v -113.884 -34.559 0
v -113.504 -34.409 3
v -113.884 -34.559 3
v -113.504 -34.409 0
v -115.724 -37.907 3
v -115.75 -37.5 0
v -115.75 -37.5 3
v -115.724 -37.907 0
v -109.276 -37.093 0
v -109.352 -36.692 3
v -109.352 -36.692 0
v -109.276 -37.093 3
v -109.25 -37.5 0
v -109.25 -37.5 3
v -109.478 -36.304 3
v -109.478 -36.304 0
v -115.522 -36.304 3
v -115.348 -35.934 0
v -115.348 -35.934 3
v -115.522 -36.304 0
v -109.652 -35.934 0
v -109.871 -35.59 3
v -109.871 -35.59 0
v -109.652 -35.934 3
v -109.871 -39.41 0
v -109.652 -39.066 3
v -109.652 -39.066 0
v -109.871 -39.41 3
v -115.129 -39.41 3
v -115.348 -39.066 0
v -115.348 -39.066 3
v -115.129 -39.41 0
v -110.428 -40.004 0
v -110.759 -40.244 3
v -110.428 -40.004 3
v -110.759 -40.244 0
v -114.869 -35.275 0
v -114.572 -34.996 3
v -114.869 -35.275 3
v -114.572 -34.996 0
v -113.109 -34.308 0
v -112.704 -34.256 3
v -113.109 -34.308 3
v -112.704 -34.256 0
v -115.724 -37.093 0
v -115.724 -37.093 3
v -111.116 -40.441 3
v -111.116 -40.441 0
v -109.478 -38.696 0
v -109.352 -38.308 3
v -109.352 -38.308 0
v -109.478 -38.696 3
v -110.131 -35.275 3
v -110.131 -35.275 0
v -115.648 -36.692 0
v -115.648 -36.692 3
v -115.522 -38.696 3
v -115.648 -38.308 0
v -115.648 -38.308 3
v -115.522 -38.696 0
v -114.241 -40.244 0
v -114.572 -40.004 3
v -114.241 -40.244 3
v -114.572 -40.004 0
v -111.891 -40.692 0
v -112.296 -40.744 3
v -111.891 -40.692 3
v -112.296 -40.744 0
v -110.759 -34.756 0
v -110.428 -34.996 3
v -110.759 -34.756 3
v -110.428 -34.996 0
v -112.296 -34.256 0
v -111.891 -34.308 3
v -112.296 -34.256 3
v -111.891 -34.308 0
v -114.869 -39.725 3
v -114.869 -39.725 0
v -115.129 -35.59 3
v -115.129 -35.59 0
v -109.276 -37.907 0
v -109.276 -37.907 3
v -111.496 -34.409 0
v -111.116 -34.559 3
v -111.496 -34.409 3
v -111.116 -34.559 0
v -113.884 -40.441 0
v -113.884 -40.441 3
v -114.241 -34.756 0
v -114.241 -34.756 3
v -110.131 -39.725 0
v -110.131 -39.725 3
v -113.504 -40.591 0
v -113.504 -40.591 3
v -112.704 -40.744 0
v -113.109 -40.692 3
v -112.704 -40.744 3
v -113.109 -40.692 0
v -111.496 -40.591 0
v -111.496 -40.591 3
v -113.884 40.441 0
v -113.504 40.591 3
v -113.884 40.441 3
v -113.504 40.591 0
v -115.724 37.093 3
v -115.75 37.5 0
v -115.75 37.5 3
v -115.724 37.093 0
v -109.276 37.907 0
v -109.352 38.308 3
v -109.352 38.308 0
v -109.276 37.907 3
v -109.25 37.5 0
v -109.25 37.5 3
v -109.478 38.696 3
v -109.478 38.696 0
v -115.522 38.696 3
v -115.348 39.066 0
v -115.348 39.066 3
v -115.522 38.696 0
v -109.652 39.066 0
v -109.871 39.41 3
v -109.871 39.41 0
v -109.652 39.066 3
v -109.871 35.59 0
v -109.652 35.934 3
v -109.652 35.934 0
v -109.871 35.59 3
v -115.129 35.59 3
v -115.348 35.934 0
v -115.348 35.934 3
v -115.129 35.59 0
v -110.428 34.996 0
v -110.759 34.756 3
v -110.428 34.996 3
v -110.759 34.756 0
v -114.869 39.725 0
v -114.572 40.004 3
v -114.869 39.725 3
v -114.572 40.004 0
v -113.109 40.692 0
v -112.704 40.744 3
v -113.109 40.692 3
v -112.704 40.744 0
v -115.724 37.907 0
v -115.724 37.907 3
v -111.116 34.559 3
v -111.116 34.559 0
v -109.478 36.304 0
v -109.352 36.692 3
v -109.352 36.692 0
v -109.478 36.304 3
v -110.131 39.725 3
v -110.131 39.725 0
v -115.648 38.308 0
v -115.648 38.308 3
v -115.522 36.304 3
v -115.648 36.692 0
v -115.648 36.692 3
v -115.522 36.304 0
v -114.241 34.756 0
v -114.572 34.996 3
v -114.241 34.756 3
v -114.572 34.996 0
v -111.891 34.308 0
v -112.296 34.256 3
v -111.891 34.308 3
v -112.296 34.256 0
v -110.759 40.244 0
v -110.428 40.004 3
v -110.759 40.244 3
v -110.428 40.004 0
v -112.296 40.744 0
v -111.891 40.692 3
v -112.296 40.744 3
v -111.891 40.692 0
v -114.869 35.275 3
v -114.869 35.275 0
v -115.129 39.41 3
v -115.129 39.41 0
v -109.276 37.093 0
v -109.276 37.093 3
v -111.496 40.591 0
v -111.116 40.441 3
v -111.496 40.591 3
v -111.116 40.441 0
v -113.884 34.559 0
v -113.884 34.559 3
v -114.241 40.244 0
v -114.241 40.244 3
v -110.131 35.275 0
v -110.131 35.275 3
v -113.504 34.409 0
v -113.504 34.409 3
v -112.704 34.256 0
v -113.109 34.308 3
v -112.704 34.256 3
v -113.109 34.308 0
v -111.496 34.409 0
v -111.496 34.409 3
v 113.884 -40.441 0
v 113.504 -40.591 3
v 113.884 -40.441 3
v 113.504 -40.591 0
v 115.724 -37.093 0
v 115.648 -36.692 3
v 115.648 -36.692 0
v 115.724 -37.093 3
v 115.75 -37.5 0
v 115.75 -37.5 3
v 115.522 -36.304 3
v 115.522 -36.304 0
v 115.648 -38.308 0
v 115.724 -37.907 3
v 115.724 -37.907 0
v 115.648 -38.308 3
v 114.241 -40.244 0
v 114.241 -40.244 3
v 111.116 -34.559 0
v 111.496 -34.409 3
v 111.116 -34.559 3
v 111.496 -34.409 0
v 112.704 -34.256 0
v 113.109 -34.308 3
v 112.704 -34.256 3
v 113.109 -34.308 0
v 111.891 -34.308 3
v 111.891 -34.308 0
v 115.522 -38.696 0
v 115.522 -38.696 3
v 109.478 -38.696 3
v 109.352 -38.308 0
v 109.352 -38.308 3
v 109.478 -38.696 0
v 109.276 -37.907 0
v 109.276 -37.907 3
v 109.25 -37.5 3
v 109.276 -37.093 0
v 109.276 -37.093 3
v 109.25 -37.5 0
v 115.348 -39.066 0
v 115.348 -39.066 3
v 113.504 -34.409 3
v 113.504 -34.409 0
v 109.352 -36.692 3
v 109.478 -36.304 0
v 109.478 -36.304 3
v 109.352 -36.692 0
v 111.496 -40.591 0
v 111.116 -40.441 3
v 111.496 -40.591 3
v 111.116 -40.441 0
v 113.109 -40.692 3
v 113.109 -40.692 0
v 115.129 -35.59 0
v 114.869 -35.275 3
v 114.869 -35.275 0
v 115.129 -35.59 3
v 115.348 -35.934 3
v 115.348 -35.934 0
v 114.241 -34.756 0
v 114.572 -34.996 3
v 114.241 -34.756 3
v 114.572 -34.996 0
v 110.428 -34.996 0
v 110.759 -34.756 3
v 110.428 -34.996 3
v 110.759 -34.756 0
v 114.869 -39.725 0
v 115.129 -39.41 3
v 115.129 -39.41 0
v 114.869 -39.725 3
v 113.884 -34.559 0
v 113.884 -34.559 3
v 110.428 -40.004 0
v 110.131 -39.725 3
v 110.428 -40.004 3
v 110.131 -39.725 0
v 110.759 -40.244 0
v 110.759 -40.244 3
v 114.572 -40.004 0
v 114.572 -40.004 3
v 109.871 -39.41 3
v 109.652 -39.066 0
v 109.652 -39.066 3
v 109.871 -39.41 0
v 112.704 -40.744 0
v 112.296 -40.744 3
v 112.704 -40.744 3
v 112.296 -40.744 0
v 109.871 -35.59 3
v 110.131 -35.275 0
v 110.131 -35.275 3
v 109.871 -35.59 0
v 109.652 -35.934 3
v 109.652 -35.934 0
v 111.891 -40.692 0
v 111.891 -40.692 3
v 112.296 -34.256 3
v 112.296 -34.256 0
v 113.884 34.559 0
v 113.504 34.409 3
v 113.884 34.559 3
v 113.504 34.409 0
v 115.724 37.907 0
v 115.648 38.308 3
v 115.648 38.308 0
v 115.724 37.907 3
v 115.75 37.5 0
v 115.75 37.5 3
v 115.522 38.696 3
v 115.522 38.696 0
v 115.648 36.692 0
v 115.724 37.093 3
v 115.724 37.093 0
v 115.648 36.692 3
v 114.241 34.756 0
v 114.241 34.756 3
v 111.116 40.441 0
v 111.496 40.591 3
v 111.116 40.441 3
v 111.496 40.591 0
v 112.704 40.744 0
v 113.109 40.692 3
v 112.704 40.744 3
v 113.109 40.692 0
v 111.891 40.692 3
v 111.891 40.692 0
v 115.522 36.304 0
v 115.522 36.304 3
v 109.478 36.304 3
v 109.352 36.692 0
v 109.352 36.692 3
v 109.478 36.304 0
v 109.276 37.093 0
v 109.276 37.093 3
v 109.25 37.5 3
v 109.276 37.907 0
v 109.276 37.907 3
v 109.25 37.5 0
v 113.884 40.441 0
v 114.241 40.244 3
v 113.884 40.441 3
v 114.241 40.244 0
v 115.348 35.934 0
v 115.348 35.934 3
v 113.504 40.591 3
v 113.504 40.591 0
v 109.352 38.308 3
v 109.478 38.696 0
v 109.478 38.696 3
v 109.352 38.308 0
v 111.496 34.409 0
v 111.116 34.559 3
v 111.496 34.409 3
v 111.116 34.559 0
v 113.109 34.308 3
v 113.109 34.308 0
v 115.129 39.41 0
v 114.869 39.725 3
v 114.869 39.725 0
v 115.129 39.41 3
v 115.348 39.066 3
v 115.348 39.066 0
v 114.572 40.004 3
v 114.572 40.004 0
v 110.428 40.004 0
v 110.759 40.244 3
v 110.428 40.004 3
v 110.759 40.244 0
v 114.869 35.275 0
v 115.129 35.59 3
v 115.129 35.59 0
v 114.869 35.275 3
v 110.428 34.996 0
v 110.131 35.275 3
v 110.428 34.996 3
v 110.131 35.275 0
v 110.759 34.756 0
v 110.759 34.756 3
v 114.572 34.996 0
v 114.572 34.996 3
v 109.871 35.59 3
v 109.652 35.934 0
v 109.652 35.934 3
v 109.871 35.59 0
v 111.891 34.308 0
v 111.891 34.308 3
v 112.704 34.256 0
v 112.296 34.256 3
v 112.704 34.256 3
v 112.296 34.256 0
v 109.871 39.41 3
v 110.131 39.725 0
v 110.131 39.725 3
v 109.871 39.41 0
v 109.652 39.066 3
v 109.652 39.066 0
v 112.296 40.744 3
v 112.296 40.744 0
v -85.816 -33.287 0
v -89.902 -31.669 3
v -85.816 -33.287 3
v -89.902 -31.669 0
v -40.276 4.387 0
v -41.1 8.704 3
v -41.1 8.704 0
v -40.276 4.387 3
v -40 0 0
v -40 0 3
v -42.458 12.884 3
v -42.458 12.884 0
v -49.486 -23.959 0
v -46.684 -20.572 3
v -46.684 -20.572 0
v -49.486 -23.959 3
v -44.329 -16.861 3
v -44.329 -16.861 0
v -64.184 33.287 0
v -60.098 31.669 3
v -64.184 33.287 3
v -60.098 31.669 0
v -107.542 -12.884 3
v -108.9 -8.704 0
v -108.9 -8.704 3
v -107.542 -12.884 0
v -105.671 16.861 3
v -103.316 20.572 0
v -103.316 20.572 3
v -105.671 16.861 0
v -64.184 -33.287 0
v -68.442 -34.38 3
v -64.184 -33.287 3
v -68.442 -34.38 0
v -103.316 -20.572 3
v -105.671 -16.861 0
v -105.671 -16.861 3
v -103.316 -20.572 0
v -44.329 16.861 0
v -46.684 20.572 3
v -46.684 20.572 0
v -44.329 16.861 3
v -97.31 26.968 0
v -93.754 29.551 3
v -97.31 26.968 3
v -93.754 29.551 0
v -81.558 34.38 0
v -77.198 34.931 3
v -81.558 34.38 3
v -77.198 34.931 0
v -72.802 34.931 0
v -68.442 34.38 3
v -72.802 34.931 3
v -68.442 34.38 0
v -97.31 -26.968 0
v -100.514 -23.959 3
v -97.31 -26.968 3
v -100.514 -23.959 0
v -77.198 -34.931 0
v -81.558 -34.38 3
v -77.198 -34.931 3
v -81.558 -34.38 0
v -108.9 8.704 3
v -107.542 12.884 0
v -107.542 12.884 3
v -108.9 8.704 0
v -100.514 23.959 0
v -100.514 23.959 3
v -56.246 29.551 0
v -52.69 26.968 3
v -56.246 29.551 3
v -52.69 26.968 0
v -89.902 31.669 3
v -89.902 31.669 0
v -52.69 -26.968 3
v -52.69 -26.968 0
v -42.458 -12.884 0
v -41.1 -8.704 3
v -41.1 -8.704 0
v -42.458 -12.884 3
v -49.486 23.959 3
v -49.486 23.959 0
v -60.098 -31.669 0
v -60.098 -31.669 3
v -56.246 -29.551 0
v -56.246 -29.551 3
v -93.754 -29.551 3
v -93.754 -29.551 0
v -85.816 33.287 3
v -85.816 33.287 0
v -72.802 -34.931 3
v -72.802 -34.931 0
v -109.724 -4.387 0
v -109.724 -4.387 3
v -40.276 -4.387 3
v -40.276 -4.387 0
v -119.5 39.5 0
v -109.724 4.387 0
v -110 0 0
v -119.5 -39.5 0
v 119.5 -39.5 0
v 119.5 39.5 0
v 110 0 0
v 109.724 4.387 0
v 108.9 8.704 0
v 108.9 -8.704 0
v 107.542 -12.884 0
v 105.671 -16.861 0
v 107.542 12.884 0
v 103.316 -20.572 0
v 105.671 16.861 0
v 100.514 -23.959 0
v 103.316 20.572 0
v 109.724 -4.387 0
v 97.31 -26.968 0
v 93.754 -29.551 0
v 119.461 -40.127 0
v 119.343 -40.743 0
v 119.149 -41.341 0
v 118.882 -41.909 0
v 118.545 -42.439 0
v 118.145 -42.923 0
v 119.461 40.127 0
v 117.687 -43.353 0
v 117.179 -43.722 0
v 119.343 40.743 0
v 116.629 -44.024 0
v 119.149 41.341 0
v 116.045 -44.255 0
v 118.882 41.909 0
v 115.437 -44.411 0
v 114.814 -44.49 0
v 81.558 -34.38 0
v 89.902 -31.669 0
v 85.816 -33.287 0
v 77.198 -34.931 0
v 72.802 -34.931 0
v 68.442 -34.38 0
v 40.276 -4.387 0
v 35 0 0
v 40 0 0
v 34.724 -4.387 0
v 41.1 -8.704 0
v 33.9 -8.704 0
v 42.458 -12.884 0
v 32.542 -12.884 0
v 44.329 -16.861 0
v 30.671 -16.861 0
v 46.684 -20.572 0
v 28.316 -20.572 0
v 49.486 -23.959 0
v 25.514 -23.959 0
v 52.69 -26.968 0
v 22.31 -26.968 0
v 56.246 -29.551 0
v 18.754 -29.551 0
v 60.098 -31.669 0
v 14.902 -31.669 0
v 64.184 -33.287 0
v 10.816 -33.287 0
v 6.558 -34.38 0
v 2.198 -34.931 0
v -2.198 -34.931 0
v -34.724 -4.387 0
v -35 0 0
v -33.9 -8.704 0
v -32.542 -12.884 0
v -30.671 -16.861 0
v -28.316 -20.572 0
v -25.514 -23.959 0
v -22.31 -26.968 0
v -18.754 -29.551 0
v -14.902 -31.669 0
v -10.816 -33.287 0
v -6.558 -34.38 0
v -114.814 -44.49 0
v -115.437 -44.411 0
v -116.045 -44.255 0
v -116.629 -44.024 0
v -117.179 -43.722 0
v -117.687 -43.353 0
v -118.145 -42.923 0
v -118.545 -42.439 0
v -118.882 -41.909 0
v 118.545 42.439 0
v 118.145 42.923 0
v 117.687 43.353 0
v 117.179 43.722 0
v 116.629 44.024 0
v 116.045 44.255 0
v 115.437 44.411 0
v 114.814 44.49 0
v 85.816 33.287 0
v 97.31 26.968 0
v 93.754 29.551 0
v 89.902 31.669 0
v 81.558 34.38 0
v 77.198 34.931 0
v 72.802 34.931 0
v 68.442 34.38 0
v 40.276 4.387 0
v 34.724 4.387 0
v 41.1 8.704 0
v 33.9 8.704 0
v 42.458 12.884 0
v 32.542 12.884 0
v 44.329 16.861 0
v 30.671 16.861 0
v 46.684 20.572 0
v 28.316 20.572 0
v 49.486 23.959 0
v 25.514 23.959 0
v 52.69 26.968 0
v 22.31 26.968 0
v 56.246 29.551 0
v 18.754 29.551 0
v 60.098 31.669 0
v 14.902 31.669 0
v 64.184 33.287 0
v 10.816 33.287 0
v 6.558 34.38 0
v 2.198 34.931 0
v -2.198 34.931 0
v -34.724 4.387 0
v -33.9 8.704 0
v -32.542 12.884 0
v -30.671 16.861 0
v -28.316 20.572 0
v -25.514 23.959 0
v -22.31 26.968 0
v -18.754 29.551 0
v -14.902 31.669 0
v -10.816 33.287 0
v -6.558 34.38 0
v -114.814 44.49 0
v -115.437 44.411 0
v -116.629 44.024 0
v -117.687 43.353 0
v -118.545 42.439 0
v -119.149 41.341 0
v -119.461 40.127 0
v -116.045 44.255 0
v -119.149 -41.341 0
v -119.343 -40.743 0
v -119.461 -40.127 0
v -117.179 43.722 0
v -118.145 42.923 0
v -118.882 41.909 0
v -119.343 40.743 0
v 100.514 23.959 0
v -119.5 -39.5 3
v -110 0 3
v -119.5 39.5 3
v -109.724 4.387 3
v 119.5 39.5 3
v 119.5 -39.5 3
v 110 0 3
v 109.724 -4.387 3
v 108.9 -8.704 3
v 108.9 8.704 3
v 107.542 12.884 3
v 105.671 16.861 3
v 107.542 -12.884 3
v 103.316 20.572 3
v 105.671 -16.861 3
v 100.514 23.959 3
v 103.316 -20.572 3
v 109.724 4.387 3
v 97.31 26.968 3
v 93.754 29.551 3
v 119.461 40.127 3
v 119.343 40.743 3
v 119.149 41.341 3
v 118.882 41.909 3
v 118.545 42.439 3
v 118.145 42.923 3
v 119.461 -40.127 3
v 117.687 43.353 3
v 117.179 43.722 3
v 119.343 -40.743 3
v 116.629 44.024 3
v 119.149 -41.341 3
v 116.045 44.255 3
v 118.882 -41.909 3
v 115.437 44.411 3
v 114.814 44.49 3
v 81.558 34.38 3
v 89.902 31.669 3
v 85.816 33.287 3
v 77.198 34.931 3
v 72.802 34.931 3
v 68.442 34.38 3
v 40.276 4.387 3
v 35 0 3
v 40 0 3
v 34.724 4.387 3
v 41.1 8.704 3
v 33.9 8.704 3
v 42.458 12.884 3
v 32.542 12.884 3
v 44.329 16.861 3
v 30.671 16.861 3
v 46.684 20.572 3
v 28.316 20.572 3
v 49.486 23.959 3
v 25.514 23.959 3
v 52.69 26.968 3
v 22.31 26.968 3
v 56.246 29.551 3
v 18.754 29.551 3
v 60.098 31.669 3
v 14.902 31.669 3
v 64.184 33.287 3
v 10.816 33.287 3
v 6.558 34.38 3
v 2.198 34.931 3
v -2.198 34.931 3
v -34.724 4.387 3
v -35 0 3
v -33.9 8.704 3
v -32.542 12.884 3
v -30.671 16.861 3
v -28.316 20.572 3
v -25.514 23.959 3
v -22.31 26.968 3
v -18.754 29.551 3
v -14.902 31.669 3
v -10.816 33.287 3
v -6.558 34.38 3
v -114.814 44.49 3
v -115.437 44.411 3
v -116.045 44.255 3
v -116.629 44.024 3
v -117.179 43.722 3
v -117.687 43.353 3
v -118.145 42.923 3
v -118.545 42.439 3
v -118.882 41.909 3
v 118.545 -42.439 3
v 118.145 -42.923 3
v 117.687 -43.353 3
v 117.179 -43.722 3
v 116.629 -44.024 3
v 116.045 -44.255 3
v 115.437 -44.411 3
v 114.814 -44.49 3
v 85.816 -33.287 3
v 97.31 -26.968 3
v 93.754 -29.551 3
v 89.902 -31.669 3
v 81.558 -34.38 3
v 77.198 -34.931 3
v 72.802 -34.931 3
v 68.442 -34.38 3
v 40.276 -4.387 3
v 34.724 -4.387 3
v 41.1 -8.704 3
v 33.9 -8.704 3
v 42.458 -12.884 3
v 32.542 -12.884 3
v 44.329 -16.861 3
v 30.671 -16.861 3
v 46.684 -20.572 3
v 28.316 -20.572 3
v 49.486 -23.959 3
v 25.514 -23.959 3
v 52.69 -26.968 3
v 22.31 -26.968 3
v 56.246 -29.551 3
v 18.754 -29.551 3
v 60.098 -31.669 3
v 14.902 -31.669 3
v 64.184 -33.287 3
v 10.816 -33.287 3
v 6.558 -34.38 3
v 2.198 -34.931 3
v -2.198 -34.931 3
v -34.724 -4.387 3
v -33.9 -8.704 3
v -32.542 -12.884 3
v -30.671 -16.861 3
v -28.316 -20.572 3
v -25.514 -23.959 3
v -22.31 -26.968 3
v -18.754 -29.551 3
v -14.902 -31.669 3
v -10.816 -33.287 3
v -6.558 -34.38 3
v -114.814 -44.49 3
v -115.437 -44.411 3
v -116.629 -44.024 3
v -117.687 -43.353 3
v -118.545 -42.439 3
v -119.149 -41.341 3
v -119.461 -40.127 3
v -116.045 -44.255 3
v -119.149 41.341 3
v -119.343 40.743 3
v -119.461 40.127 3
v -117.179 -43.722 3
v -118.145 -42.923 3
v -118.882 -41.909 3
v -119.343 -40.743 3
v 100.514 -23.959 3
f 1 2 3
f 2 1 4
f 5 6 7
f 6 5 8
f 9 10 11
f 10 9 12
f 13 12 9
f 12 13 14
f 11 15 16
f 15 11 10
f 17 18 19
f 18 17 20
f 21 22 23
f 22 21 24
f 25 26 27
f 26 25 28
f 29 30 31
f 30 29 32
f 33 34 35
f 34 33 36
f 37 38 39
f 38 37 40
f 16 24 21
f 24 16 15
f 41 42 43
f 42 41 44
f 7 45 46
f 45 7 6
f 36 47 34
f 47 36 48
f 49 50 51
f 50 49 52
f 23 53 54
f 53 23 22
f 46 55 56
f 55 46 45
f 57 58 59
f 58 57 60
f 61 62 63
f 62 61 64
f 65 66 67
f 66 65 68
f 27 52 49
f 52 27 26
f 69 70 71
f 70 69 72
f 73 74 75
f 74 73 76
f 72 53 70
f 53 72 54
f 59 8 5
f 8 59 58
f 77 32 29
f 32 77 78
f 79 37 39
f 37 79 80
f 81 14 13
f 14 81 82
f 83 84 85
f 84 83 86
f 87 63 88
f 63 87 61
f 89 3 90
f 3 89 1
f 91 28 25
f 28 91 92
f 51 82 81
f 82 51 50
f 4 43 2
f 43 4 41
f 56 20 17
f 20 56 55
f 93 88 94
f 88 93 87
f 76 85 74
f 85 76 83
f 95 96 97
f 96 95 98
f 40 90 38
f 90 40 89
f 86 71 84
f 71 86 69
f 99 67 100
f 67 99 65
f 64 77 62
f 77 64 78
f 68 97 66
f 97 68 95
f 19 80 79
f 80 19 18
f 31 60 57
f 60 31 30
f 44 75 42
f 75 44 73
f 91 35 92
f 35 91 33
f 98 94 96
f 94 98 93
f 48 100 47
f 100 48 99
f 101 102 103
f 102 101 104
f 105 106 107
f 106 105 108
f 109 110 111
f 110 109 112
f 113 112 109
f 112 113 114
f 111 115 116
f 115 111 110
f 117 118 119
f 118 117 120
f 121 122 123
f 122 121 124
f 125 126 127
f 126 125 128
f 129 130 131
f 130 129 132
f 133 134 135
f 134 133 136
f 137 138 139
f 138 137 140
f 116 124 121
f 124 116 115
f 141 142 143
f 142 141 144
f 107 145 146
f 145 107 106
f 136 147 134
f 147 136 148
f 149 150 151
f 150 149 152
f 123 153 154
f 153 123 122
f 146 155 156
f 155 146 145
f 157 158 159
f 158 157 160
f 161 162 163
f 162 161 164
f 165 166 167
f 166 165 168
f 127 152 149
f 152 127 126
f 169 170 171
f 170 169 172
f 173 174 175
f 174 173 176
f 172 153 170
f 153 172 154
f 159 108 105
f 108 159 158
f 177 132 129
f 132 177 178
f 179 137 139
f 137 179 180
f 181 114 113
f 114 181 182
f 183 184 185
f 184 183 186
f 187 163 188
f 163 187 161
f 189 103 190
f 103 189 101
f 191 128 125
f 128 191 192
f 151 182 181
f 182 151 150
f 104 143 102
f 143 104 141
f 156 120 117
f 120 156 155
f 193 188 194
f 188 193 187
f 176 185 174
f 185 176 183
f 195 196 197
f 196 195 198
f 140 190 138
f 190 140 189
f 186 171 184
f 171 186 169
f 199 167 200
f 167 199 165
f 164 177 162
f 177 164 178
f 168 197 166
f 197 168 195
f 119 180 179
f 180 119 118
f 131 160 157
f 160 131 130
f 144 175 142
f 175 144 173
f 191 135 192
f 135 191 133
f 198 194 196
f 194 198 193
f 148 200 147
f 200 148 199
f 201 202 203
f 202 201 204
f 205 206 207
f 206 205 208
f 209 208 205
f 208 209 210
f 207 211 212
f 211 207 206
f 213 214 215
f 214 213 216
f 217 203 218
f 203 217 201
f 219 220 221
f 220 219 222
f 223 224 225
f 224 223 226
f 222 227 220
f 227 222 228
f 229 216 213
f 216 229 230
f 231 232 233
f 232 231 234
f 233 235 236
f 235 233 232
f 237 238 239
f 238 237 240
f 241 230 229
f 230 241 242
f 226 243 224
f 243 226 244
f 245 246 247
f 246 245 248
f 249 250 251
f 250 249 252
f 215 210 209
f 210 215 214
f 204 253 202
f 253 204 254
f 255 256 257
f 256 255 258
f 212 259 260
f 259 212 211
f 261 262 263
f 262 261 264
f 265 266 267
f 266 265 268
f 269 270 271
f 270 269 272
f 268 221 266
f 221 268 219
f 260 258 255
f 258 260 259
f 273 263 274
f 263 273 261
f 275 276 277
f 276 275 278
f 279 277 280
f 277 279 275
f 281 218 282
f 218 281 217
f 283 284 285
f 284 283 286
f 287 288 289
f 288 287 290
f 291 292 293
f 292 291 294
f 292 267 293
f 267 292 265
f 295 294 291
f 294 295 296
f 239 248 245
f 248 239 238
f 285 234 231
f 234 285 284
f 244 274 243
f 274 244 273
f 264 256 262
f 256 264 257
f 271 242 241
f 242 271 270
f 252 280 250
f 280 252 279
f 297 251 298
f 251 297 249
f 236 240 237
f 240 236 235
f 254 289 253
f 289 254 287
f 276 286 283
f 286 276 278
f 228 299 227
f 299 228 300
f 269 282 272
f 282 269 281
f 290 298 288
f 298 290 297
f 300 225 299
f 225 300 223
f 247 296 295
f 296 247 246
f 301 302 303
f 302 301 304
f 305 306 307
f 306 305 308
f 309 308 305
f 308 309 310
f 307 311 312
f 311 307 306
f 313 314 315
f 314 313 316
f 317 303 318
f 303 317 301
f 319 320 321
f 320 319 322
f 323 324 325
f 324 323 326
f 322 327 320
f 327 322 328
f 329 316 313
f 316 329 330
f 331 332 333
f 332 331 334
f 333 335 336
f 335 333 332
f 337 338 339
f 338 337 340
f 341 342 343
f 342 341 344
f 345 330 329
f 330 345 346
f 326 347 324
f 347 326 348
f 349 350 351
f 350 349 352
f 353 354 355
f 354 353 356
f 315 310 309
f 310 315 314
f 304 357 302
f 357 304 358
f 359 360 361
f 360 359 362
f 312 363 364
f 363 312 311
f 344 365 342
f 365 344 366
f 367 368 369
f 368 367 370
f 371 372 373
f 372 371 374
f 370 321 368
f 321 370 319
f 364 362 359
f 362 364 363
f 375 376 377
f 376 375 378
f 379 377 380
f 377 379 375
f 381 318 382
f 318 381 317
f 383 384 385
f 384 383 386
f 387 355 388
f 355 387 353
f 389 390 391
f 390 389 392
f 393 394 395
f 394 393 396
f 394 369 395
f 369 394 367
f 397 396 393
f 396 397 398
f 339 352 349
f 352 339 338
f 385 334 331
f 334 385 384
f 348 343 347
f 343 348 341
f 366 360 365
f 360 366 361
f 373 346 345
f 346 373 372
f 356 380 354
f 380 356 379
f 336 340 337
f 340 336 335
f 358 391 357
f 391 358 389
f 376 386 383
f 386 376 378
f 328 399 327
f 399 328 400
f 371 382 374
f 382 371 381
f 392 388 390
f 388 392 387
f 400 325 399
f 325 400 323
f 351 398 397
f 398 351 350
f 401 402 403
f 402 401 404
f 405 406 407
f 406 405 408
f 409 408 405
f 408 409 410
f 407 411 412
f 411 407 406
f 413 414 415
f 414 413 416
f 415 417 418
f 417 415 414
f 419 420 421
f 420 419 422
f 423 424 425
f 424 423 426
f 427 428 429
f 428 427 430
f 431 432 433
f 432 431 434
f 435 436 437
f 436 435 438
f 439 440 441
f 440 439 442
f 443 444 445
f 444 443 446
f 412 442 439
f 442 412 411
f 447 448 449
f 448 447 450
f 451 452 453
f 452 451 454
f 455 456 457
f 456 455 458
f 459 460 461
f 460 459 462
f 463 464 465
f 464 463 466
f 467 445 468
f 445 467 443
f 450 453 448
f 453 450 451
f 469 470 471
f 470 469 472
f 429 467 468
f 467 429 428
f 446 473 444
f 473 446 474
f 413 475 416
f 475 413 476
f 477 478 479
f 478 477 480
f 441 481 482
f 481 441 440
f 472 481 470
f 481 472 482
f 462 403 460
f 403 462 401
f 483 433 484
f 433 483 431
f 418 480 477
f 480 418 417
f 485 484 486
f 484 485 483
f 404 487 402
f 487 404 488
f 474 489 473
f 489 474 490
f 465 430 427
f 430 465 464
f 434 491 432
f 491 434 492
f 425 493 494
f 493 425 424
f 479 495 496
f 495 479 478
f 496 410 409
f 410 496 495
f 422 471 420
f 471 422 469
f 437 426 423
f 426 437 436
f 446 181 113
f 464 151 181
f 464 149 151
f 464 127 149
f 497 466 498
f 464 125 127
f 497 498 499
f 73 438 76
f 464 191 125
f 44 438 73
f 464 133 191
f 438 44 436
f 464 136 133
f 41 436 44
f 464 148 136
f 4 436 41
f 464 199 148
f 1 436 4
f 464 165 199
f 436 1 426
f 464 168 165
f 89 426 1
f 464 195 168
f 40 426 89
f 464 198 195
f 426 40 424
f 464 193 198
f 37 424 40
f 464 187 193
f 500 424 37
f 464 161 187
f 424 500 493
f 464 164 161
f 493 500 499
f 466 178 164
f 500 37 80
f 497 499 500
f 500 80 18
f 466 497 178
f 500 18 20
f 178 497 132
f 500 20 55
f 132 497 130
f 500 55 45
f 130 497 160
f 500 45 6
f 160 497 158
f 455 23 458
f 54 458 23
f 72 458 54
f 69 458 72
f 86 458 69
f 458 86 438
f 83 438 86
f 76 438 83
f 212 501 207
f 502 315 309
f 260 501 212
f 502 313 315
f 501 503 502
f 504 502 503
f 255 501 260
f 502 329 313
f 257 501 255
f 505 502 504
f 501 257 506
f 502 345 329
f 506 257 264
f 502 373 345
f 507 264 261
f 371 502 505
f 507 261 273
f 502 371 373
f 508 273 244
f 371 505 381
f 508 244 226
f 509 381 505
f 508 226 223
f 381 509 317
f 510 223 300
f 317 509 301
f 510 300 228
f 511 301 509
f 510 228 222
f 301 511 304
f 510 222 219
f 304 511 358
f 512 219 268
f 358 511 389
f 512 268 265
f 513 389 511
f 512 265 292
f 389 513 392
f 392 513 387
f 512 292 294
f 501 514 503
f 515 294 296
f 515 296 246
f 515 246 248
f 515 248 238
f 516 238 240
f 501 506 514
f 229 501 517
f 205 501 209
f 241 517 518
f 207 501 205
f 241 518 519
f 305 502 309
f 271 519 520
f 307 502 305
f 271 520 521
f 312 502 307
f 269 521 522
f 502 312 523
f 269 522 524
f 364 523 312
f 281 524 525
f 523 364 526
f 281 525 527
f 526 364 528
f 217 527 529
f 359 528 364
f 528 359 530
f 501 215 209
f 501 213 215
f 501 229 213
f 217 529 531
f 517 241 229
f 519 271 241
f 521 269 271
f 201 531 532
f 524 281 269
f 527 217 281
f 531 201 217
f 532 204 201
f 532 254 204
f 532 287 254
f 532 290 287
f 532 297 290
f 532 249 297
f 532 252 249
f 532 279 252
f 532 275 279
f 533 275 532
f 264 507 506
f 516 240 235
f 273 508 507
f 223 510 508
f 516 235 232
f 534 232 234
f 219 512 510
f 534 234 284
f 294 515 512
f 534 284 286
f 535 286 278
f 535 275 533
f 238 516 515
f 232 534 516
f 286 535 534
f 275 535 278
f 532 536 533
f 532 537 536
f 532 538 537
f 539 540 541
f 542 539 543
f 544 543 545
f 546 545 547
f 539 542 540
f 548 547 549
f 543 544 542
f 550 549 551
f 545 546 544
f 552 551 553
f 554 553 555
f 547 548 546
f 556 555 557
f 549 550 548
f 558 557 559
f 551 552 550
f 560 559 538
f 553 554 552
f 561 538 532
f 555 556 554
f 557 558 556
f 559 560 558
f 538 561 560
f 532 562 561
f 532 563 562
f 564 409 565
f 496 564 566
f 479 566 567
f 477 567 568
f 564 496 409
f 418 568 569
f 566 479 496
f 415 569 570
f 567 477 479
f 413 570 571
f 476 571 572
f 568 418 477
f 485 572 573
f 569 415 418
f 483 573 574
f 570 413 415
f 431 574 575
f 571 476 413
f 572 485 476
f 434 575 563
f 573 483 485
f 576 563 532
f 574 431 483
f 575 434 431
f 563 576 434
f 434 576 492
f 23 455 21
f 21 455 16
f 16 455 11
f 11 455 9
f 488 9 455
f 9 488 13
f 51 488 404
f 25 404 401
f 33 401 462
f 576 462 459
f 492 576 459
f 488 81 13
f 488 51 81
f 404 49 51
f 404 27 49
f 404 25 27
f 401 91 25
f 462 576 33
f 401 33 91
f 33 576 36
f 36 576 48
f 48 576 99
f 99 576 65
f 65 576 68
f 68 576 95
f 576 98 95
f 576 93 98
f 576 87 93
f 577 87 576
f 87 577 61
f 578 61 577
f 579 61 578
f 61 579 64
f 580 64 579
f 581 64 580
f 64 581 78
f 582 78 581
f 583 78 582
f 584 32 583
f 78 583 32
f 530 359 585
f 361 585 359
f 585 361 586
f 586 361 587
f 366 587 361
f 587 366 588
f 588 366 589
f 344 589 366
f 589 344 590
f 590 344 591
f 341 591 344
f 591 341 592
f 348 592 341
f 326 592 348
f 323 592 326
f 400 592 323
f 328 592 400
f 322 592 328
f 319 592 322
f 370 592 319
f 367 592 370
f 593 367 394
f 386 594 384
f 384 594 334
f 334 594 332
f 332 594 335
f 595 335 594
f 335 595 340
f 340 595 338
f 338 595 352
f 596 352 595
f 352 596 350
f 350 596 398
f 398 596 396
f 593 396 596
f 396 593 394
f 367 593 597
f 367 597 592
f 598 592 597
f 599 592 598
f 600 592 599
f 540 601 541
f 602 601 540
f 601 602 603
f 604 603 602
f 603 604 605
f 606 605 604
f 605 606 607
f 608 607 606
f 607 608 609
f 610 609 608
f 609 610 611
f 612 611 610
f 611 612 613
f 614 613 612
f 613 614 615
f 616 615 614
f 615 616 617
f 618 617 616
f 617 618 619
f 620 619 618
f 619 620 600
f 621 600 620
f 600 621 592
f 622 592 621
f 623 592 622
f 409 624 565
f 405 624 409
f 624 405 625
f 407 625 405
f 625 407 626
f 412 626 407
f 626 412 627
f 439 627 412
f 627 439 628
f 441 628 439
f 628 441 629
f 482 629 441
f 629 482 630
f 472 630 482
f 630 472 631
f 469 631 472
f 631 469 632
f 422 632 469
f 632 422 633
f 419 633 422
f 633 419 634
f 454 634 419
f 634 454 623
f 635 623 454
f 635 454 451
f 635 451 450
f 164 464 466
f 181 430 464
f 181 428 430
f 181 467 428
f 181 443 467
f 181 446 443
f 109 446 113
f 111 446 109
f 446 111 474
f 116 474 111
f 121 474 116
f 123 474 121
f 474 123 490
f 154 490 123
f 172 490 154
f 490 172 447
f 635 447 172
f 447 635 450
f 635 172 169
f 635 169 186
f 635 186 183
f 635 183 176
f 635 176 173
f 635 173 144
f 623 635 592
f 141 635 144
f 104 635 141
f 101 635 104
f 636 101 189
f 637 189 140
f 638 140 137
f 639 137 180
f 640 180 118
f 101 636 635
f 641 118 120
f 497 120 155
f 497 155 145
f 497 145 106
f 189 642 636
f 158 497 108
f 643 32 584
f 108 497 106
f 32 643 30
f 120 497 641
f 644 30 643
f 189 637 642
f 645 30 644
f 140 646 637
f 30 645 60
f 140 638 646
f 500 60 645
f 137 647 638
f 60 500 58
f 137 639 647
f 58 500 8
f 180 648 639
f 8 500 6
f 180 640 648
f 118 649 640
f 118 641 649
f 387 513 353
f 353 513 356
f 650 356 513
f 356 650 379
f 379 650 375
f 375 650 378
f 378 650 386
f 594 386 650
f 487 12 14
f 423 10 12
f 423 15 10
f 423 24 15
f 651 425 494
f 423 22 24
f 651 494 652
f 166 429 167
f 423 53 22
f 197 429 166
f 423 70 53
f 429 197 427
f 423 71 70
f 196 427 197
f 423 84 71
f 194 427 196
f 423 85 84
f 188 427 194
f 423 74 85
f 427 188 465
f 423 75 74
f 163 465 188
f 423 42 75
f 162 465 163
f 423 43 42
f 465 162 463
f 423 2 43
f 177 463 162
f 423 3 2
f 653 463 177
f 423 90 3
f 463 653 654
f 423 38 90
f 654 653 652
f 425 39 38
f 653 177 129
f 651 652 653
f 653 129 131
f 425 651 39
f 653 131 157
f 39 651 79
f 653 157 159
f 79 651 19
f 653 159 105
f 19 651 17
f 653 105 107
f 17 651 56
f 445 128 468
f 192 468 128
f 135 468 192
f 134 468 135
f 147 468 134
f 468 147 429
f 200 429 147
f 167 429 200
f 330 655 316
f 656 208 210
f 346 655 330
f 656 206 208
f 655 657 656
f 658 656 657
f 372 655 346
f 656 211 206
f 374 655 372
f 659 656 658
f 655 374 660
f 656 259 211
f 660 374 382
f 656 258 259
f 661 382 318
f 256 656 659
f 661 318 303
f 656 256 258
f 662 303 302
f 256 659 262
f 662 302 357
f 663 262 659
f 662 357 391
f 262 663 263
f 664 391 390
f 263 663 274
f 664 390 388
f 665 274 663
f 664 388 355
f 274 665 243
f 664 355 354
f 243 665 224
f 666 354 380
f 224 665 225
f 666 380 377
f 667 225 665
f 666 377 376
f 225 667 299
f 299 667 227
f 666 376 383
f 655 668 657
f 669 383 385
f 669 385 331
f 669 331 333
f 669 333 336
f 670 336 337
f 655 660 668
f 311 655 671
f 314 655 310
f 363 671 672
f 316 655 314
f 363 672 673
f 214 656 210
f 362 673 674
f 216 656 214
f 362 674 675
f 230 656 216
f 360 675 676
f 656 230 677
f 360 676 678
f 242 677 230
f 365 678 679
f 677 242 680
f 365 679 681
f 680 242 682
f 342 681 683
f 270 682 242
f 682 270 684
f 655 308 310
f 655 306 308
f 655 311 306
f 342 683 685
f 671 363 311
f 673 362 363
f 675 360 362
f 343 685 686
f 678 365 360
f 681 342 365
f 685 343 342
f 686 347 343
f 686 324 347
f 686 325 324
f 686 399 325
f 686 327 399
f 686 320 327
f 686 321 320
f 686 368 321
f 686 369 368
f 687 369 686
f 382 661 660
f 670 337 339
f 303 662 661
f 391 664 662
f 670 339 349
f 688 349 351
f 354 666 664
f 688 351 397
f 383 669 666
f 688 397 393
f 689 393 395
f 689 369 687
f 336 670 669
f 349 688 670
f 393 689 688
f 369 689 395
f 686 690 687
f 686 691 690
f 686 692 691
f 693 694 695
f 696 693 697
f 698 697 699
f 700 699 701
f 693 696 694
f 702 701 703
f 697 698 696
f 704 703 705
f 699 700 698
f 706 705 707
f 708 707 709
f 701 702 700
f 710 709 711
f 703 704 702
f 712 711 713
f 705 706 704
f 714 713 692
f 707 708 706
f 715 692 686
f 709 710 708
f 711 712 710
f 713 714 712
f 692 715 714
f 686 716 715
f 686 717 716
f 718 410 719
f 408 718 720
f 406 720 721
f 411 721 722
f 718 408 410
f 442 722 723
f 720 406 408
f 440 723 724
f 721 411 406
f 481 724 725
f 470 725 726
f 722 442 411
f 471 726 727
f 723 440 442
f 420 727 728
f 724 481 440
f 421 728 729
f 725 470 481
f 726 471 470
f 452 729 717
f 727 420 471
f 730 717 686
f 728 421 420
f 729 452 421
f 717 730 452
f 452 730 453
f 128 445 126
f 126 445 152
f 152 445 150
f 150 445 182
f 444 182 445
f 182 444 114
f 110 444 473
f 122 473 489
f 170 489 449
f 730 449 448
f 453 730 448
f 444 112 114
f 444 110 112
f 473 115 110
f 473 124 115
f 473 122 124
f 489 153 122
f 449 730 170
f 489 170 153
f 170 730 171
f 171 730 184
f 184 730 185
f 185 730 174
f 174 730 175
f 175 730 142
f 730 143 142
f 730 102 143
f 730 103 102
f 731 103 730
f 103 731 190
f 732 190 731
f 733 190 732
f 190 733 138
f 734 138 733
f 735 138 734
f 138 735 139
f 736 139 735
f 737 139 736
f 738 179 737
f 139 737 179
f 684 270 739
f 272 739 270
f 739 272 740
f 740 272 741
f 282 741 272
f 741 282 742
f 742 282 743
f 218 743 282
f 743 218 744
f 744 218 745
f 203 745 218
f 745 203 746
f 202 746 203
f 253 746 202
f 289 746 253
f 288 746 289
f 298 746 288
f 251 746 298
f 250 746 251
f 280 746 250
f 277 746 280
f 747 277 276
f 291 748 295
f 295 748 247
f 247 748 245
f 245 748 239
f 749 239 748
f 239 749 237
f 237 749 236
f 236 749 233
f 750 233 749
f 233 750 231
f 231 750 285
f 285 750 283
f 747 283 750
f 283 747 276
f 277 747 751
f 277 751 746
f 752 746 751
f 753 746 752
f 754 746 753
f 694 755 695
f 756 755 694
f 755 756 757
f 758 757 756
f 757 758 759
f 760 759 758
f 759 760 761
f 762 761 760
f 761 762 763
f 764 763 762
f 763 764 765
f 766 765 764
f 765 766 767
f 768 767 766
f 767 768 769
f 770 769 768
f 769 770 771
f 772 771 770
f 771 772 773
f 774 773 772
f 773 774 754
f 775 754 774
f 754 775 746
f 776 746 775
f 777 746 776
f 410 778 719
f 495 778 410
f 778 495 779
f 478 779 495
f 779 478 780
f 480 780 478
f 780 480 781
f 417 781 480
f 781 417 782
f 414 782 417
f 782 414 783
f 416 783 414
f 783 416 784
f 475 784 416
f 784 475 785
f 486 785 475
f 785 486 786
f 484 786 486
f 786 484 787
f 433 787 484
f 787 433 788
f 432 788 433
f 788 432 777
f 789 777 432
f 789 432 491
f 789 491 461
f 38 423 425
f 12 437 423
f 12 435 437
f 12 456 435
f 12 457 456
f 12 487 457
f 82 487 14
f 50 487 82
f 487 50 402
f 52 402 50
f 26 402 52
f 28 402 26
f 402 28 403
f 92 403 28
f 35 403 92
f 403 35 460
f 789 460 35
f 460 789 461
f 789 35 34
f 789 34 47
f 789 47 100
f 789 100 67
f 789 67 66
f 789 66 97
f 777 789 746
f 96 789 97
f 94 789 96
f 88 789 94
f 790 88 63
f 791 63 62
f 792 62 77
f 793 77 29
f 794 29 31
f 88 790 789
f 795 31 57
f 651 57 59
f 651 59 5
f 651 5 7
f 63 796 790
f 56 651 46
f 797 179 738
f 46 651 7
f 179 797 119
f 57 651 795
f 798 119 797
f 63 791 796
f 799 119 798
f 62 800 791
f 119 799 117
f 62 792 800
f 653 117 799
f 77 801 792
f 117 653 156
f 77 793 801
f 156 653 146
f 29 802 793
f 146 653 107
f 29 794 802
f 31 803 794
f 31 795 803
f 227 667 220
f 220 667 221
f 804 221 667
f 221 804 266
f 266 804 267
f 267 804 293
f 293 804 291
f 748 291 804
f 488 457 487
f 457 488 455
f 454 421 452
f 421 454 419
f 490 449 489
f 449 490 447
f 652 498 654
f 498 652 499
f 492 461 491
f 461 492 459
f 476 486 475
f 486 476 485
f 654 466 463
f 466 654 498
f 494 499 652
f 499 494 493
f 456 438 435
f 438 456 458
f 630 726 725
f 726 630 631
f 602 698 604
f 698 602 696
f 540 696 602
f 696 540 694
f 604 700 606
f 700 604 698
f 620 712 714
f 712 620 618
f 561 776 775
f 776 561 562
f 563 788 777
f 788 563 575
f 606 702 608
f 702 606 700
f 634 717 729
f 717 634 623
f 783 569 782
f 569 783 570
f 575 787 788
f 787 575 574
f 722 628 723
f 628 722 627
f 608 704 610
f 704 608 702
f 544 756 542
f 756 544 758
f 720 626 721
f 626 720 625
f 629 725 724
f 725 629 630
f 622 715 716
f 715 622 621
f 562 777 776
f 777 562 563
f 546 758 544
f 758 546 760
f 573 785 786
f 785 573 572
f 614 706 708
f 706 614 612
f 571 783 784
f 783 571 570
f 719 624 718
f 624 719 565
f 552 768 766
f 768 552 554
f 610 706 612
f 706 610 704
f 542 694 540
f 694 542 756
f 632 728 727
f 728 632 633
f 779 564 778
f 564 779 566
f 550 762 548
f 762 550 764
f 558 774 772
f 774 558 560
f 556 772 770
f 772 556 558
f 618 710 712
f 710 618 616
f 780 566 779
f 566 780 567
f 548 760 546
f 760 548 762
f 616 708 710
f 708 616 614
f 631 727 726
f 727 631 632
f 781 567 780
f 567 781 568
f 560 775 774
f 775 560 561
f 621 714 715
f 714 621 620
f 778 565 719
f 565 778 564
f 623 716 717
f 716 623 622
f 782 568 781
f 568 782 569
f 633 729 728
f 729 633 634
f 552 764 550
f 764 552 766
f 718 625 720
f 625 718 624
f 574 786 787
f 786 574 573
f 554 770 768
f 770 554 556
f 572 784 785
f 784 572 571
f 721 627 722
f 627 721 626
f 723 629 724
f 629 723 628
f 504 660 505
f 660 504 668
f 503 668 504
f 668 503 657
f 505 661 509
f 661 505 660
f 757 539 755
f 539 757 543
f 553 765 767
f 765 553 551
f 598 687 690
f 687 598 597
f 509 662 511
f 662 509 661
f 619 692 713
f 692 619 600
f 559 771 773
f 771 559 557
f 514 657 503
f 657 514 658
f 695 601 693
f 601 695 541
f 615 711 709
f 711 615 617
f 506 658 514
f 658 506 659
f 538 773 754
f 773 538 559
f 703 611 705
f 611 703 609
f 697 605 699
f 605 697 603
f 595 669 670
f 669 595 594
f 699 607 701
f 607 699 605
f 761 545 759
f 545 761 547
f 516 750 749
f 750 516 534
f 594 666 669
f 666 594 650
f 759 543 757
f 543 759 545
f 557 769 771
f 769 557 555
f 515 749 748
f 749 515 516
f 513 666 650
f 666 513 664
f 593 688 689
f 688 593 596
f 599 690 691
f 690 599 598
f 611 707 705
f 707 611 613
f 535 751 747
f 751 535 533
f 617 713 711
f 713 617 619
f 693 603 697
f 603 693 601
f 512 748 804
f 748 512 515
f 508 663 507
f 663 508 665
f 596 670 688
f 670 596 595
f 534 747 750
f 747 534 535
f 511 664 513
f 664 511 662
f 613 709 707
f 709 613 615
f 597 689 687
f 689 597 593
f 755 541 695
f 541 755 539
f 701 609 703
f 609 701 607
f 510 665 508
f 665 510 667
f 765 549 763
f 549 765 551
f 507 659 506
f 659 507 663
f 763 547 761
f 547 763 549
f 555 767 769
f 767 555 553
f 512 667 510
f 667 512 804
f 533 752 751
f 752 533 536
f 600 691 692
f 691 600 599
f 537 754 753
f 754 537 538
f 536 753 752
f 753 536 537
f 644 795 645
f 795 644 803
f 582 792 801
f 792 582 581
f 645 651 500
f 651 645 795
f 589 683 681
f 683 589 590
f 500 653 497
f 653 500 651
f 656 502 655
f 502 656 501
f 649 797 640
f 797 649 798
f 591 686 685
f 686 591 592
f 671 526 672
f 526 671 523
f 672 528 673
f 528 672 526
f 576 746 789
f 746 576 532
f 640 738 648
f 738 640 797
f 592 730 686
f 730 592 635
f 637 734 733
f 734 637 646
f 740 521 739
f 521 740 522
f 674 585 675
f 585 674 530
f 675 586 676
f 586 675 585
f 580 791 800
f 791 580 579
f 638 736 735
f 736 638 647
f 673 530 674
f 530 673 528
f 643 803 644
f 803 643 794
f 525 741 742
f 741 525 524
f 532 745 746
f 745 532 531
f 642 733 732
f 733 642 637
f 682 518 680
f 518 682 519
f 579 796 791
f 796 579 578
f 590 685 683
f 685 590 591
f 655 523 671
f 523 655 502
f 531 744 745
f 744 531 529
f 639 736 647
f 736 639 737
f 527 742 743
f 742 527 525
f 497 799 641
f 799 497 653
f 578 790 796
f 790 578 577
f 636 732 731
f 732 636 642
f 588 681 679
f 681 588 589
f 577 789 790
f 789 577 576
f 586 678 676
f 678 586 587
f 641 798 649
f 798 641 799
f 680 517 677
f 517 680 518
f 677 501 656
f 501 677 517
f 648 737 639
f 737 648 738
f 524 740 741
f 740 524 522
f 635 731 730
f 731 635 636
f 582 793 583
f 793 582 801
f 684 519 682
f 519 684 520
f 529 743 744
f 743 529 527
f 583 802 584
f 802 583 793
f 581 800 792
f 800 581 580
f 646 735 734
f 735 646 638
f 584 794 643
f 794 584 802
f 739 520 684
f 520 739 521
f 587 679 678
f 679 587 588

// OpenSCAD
$fn = 50;

difference() {
	union() {
		hull() {
			translate(v = [-114.5, 39.5, 0]) {
				cylinder(h = 3, r = 5);
			}
			translate(v = [114.5, 39.5, 0]) {
				cylinder(h = 3, r = 5);
			}
			translate(v = [-114.5, -39.5, 0]) {
				cylinder(h = 3, r = 5);
			}
			translate(v = [114.5, -39.5, 0]) {
				cylinder(h = 3, r = 5);
			}
		}
	}
	union() {
		translate(v = [-112.5, -37.5, -100.0]) {
			cylinder(h = 200, r = 3.25);
		}
		translate(v = [-112.5, 37.5, -100.0]) {
			cylinder(h = 200, r = 3.25);
		}
		translate(v = [112.5, -37.5, -100.0]) {
			cylinder(h = 200, r = 3.25);
		}
		translate(v = [112.5, 37.5, -100.0]) {
			cylinder(h = 200, r = 3.25);
		}
		translate(v = [-112.5, -37.5, -100.0]) {
			cylinder(h = 200, r = 1.8);
		}
		translate(v = [-112.5, 37.5, -100.0]) {
			cylinder(h = 200, r = 1.8);
		}
		translate(v = [112.5, -37.5, -100.0]) {
			cylinder(h = 200, r = 1.8);
		}
		translate(v = [112.5, 37.5, -100.0]) {
			cylinder(h = 200, r = 1.8);
		}
		translate(v = [-75.0, 0, 0.0]) {
			cylinder(h = 3, r = 35.0);
		}
		cylinder(h = 3, r = 35.0);
		translate(v = [75.0, 0, 0.0]) {
			cylinder(h = 3, r = 35.0);
		}
	}
}
